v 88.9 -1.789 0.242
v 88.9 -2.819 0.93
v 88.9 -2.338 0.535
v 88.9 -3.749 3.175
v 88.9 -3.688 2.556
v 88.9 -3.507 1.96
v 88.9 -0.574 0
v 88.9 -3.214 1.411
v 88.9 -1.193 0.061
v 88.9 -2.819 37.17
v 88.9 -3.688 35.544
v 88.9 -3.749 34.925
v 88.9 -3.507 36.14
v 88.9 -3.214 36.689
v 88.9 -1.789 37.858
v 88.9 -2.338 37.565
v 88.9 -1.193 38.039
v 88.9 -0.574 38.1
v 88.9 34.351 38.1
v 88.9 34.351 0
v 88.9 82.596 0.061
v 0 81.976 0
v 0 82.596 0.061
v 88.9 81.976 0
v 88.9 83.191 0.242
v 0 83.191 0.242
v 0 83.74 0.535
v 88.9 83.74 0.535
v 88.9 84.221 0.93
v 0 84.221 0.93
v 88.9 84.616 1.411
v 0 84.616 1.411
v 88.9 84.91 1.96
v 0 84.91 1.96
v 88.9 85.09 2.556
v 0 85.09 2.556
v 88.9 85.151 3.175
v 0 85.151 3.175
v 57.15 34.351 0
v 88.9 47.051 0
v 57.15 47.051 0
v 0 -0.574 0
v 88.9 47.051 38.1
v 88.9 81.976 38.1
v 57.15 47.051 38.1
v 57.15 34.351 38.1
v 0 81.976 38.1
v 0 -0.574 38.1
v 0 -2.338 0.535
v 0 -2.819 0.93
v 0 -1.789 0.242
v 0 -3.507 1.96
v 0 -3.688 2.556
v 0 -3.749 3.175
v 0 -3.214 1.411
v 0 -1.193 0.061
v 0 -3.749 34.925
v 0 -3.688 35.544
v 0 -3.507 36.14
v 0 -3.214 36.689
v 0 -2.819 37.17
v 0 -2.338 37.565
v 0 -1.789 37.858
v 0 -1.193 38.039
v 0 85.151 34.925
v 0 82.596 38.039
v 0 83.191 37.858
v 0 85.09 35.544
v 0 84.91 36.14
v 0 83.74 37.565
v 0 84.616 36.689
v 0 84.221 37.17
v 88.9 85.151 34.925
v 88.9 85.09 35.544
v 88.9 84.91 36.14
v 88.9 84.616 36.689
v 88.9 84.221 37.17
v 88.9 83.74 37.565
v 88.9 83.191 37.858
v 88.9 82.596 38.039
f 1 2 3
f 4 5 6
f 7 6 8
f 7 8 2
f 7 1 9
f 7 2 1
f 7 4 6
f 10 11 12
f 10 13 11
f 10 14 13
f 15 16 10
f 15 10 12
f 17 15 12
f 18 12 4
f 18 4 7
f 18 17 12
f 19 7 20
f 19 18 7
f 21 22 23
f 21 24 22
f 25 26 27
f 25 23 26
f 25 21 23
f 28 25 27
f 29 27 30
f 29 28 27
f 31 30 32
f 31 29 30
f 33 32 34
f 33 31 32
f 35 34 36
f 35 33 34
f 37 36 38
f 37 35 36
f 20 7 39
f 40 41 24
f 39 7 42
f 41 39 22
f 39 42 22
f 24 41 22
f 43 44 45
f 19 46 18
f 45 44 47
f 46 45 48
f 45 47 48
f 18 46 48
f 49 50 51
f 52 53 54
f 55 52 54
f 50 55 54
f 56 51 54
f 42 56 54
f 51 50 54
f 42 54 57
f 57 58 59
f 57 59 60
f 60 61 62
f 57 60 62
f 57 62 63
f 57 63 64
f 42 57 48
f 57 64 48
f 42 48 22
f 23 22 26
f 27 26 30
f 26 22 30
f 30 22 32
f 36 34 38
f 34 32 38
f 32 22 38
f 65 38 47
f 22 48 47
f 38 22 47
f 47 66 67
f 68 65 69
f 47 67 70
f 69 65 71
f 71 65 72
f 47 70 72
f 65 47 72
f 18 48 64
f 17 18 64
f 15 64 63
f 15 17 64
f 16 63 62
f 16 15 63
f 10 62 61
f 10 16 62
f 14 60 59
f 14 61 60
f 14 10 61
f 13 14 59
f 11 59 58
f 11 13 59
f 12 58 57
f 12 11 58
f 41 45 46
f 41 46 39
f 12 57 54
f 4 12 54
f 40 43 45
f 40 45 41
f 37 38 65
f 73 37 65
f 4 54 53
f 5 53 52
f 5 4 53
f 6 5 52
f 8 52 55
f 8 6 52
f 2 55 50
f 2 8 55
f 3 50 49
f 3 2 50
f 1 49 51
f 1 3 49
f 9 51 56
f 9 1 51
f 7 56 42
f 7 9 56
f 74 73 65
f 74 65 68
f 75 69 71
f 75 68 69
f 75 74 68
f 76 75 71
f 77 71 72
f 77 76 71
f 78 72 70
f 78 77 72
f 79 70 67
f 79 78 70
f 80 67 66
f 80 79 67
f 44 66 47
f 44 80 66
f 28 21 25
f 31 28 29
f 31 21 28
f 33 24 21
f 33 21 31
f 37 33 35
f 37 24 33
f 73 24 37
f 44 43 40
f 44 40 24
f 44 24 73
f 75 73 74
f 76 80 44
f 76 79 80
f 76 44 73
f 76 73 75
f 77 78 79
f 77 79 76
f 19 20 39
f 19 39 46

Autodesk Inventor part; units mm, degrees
ref_plane "YZ Plane" through (0, 0, 0) normal (1, 0, 0) x (0, 1, 0)
ref_plane "XZ Plane" through (0, 0, 0) normal (0, 1, 0) x (-1, 0, 0)
ref_plane "XY Plane" through (0, 0, 0) normal (0, 0, 1) x (1, 0, 0)
sketch "Sketch1" plane through (0, 0, 0) normal (1, 0, 0) x (0, 1, 0)
  line L0 (-3.7488, 0) -> (85.1512, 0)
  line L1 (85.1512, 0) -> (85.1512, 38.1)
  line L2 (85.1512, 38.1) -> (-3.7488, 38.1)
  line L3 (-3.7488, 38.1) -> (-3.7488, 0)
  point P0 (0, 0)
  dimension "d0" = 88.9
  dimension "d1" = 38.1
extrude "Extrusion1" add sketch "Sketch1" along normal blind 88.9
fillet "Fillet1" radius 3.175 4 edges at (44.45, 85.1512, 38.1) (44.45, 85.1512, 0) (44.45, -3.7488, 0) (44.45, -3.7488, 38.1)
sketch "Sketch2" plane through (88.9, 0, 0) normal (1, 0, 0) x (0, 0, -1)
  line L0 (-34.925, -3.7488) -> (-3.175, -3.7488) projected
  line L1 (0, -0.5738) -> (0, 81.9762) projected
  line L2 (-3.175, 85.1512) -> (-34.925, 85.1512) projected
  line L3 (-38.1, 81.9762) -> (-38.1, -0.5738) projected
  line L4 (-38.1, 47.0512) -> (0, 47.0512)
  line L5 (0, 47.0512) -> (0, 34.3512)
  line L6 (0, 34.3512) -> (-38.1, 34.3512)
  line L7 (-38.1, 34.3512) -> (-38.1, 47.0512)
  point P0 (0, 0)
  dimension "d5" = 38.1
  dimension "d6" = 38.1
extrude "Extrusion2" cut sketch "Sketch2" against normal blind 31.75
properties part number "2x4x3.5" material "Ash"
